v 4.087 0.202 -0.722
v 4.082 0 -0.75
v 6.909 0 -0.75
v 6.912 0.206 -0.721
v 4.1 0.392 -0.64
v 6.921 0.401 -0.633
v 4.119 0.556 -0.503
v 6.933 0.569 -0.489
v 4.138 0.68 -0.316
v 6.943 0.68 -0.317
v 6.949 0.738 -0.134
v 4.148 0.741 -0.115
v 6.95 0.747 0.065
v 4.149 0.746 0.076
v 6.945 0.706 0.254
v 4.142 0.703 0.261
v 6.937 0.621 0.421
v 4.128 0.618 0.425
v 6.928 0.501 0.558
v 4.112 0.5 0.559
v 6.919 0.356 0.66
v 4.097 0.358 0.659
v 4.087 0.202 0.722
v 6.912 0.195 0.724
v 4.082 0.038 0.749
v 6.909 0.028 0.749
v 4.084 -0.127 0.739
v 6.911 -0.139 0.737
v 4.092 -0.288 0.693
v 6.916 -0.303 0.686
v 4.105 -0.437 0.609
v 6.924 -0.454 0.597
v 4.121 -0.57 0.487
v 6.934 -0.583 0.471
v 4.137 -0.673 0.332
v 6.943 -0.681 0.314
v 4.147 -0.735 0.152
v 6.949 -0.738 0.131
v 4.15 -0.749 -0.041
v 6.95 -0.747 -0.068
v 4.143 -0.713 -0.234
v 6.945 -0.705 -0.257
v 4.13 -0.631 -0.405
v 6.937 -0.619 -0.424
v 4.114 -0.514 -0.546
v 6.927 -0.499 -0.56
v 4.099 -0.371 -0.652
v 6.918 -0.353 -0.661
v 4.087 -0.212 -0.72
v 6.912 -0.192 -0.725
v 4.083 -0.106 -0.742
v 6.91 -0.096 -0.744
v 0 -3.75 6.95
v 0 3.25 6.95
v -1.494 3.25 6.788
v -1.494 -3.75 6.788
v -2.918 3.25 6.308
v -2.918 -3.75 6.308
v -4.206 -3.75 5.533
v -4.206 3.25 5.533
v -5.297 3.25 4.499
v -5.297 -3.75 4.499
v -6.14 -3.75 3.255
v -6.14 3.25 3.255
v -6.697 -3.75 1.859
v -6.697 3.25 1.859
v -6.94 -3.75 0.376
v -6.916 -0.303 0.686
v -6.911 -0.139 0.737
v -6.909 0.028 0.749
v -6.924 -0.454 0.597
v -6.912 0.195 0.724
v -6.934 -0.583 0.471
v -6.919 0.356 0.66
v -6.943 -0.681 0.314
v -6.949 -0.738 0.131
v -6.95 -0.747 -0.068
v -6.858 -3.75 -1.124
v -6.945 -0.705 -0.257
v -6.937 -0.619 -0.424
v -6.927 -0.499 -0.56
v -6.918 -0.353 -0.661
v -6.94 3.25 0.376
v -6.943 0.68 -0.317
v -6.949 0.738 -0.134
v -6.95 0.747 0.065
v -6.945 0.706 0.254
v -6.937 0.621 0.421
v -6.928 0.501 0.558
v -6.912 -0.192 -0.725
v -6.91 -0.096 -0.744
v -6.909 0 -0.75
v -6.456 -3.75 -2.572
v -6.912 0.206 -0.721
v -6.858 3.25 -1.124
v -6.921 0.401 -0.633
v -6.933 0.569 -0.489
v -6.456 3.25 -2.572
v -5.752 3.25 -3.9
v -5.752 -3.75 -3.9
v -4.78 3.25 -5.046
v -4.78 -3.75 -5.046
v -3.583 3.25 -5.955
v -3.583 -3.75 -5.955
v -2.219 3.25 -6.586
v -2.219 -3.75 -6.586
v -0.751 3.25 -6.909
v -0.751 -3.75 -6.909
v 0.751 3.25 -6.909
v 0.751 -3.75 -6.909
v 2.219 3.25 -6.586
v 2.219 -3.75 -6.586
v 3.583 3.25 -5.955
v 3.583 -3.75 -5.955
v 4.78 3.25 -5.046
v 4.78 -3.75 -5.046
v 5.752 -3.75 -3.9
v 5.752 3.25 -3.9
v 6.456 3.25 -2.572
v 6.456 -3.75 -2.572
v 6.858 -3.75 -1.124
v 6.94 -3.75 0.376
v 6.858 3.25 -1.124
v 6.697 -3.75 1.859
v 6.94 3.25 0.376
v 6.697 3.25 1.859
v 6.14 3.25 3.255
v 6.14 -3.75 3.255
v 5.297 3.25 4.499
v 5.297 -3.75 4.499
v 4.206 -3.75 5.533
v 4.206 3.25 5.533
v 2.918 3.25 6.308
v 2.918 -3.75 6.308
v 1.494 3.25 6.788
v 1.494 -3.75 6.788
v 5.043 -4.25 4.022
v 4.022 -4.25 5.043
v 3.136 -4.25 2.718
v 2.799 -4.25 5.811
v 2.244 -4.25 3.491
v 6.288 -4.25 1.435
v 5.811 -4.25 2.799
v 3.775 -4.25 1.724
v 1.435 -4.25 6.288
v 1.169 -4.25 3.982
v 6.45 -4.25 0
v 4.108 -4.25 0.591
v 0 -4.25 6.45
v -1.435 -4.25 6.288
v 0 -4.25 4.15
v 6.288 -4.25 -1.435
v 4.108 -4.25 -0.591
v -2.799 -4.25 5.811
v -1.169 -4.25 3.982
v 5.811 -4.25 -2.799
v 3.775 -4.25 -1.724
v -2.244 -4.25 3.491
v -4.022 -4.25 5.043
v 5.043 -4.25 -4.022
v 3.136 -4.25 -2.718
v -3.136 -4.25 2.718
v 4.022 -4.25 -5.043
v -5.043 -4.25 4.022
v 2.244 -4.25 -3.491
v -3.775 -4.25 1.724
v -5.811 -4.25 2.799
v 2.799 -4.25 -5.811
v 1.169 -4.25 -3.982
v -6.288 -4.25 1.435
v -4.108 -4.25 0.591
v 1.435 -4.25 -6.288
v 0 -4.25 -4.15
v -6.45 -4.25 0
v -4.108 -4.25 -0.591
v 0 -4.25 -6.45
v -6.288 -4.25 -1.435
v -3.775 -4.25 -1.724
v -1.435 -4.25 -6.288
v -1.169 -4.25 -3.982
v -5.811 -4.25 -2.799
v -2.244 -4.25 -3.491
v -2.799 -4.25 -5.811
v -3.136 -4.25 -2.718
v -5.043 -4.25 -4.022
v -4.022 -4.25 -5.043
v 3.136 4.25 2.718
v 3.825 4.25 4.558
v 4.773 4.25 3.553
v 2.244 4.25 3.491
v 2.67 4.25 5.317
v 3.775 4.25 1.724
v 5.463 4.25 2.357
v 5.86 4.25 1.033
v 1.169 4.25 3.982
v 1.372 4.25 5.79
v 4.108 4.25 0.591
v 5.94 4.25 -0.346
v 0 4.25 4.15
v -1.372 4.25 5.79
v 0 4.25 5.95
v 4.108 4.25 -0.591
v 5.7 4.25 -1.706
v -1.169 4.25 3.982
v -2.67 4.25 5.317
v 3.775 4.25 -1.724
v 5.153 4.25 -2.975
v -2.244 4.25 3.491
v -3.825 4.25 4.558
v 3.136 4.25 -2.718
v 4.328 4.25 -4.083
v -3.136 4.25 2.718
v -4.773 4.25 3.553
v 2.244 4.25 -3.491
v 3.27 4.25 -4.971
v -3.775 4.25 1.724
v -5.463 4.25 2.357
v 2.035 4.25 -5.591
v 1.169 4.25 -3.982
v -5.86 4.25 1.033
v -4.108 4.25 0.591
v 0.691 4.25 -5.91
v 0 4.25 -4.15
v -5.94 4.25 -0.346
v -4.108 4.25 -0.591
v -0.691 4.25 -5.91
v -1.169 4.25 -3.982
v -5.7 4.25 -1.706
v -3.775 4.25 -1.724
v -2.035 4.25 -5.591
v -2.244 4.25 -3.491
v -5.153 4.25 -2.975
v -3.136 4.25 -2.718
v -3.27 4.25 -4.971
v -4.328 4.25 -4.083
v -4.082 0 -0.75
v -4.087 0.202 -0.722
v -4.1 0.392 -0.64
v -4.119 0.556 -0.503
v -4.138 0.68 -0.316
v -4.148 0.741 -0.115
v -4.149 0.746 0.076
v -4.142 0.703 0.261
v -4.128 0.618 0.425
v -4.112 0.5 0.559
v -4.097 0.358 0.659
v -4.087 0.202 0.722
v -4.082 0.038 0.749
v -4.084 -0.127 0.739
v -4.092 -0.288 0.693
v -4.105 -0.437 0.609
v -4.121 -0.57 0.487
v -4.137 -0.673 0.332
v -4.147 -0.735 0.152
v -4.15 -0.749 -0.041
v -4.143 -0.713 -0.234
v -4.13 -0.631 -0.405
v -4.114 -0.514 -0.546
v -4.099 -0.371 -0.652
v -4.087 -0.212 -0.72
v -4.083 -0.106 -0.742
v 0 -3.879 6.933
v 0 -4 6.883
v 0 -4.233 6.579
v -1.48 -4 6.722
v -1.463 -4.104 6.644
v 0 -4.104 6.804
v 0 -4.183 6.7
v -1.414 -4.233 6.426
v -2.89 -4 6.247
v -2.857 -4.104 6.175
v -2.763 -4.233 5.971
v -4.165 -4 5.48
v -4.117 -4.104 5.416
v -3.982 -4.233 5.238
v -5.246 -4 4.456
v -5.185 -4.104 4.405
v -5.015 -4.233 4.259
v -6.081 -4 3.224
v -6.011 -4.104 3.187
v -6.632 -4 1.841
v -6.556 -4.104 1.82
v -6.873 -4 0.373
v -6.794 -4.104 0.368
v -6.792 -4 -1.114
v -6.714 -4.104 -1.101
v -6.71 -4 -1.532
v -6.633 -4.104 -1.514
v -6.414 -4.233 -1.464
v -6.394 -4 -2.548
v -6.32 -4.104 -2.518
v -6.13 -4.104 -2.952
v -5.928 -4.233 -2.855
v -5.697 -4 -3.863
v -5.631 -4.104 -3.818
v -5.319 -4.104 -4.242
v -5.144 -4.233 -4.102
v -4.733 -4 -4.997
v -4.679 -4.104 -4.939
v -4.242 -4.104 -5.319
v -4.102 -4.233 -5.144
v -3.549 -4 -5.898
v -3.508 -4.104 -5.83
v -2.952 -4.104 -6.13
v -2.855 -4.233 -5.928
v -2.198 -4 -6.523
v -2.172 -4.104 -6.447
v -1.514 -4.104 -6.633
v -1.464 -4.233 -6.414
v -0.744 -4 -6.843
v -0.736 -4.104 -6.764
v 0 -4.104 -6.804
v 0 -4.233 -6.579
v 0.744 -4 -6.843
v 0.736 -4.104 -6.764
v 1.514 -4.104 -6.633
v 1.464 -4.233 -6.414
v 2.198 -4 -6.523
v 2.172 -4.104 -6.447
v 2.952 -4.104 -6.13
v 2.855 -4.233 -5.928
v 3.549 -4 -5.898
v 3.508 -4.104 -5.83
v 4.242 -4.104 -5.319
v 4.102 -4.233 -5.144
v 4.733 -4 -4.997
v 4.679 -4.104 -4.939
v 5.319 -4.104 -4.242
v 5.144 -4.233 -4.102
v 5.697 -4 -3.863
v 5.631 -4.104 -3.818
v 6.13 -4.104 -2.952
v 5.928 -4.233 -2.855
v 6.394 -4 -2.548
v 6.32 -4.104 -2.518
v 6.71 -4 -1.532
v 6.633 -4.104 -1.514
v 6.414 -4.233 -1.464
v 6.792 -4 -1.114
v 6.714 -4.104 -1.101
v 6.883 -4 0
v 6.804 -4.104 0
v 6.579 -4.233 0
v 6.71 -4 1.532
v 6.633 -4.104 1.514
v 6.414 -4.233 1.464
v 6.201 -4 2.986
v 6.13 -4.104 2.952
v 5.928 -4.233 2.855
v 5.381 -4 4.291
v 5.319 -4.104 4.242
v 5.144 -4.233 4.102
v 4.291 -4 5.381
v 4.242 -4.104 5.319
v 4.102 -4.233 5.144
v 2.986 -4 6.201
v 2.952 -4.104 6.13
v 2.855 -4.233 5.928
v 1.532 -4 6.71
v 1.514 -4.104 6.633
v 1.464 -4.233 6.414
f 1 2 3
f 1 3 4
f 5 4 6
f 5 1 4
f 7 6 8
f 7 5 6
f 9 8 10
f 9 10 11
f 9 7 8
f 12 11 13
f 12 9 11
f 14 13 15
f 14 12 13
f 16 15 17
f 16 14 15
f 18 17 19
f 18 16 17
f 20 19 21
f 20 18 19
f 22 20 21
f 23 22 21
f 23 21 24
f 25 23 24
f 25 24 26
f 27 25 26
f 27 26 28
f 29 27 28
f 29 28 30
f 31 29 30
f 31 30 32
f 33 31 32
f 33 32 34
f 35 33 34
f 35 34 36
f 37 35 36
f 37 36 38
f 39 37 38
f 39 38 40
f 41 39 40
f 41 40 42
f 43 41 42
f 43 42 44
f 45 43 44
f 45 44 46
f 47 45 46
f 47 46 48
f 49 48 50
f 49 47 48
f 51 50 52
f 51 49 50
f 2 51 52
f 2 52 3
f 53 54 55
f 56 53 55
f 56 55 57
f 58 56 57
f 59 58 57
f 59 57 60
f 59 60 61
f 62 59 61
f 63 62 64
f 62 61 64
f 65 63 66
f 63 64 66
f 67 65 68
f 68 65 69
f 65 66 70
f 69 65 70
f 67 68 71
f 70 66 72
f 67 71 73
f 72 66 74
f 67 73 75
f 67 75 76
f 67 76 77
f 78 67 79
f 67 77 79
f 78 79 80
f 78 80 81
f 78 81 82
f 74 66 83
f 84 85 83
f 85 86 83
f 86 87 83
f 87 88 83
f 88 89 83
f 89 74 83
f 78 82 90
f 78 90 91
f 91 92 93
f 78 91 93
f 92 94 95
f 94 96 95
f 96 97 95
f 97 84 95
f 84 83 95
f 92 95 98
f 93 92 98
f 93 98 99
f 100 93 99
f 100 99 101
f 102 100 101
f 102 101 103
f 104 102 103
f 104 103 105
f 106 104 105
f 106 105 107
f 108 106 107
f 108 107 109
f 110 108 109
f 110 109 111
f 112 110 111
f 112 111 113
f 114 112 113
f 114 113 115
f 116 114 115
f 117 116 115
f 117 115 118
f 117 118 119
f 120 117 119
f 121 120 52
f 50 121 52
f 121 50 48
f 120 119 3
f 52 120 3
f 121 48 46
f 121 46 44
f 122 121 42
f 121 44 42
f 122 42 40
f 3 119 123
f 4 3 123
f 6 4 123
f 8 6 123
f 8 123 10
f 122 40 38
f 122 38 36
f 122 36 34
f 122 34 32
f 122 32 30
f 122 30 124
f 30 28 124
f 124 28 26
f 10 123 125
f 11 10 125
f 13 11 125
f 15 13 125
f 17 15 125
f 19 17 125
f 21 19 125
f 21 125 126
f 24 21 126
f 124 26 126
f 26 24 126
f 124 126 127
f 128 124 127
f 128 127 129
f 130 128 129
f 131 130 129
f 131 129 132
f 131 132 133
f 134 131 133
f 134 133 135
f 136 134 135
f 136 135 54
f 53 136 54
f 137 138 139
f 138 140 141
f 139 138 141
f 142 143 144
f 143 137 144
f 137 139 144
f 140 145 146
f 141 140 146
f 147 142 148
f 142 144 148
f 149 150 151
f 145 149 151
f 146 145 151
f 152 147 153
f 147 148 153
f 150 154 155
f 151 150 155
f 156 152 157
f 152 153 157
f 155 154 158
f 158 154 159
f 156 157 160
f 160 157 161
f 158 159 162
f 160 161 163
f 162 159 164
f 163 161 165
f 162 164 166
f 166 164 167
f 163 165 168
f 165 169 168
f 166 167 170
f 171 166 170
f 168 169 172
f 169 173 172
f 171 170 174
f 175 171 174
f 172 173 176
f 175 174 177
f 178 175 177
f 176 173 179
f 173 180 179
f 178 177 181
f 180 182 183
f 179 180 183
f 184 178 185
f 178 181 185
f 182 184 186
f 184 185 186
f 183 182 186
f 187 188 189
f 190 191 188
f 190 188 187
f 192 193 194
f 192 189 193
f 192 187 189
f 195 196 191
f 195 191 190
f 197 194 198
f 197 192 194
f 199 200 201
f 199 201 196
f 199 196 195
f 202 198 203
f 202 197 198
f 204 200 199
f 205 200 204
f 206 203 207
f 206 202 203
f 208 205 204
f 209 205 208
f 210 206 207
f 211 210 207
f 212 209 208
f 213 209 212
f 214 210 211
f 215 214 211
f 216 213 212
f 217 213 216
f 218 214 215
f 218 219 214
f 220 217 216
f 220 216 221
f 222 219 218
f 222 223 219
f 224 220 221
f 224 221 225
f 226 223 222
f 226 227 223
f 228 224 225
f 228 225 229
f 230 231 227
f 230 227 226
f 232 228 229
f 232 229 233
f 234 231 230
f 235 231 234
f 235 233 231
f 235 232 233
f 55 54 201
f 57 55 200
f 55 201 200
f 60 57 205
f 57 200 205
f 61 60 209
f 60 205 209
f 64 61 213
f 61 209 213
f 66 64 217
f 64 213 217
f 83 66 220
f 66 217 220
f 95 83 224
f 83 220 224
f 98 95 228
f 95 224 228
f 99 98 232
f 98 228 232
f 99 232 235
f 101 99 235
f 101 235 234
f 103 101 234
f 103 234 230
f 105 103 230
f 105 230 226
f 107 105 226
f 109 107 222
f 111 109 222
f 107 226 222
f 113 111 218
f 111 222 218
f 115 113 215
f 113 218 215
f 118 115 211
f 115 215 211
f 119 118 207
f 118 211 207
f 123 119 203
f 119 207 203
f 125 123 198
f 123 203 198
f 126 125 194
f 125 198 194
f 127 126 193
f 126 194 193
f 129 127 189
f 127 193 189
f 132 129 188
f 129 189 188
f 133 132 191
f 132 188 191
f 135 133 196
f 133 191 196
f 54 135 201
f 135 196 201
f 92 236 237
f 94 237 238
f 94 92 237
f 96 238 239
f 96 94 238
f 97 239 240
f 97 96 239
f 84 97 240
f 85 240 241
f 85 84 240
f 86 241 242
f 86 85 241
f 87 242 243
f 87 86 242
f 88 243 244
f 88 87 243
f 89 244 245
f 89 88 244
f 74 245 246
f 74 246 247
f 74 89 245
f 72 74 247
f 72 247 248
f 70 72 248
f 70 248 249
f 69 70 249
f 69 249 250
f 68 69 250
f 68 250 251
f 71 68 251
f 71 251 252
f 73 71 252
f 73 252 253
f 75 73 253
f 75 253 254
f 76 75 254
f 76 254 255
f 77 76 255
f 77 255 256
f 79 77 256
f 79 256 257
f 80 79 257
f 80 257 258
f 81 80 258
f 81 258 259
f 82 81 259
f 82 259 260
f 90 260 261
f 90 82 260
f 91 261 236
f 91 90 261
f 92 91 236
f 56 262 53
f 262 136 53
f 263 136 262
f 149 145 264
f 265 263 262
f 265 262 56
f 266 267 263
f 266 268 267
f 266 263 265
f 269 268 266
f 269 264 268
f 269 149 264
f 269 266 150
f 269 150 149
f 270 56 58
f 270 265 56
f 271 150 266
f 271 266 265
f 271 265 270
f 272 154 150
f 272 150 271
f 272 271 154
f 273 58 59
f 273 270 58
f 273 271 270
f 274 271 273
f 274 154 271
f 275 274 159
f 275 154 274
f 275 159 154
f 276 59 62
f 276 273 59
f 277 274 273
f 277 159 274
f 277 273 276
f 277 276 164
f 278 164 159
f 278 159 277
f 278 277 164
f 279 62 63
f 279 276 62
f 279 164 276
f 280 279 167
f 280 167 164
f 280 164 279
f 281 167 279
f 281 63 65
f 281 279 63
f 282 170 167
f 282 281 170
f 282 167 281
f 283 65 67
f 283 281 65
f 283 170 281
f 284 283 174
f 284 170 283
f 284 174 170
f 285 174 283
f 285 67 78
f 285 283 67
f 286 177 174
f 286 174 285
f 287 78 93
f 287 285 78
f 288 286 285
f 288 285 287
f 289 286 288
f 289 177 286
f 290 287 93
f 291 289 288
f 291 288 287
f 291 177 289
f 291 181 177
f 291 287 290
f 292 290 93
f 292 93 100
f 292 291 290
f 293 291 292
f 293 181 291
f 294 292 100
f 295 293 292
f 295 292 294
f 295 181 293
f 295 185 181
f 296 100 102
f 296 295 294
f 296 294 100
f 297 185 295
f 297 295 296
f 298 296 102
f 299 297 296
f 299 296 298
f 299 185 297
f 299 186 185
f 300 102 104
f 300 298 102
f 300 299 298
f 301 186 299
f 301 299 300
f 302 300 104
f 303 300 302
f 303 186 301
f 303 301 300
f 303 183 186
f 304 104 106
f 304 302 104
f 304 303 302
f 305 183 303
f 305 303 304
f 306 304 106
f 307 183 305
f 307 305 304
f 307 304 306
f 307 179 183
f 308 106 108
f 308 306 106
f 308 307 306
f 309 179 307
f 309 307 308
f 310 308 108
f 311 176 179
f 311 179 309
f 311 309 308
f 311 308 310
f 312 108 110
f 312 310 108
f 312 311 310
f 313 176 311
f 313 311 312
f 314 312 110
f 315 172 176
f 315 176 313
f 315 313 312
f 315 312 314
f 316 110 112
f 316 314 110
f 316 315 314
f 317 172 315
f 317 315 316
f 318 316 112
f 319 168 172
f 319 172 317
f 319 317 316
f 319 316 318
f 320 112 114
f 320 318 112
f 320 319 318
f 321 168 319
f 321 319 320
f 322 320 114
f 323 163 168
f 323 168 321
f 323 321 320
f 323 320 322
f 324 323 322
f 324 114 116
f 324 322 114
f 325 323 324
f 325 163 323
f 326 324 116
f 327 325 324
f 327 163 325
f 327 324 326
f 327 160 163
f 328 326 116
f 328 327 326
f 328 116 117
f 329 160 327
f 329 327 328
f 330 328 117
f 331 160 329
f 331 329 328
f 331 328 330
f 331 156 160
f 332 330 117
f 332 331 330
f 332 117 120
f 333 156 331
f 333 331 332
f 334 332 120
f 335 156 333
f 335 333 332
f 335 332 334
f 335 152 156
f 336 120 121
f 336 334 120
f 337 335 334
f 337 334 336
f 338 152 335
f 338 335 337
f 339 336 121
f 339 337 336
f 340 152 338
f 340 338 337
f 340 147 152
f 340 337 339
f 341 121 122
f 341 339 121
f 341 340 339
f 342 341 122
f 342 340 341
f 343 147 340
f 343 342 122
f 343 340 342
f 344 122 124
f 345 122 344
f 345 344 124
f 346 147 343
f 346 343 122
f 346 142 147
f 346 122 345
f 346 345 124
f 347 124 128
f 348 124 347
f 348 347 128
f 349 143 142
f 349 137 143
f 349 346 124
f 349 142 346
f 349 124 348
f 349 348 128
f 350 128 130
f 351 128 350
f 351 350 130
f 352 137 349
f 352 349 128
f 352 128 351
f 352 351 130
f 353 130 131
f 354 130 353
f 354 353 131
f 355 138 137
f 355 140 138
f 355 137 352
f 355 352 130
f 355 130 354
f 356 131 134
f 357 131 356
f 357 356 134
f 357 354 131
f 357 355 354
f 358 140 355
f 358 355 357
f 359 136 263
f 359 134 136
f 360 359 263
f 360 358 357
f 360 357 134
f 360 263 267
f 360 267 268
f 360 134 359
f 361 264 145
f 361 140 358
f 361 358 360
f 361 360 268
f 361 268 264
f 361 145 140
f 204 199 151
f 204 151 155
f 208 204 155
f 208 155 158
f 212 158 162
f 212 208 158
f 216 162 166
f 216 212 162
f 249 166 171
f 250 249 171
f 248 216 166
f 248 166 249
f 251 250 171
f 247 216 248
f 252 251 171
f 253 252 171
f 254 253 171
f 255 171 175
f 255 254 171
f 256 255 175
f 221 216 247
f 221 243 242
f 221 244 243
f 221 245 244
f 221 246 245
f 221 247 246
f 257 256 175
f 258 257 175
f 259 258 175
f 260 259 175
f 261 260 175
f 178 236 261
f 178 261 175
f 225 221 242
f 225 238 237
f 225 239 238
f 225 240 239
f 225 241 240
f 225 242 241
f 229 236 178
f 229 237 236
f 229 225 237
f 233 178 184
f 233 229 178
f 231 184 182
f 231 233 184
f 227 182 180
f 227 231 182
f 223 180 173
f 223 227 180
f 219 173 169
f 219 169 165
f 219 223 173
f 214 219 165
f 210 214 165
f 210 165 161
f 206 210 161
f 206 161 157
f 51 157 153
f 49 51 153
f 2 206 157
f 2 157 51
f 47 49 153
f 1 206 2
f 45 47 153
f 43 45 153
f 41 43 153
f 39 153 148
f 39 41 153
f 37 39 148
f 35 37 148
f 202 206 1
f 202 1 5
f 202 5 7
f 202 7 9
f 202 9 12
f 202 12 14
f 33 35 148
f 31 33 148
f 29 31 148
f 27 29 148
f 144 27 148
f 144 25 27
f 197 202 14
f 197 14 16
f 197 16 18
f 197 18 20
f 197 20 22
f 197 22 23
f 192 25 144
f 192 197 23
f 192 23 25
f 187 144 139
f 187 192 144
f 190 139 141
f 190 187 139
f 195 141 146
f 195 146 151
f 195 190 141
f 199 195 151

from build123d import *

# Parameters (mm, degrees)
SKETCH1_W               = 2.8
SKETCH1_H               = 8.5
CHAMFER1_SIZE           = 1
CUT_EXTRUDE1_DEPTH      = 11.70829118
CUT_EXTRUDE1_DEPTH_BACK = 11.70829118
SKETCH3_R               = 0.75
FILLET1_R               = 0.5


with BuildPart() as part:
    # Sketch1 → Revolve1 (revolve)
    with BuildSketch(Plane(origin=(0, 0, 0), x_dir=(0, 0, -1), z_dir=(1, 0, 0)), mode=Mode.PRIVATE) as revolve1_sk:
        with Locations((5.55, 0)):
            Rectangle(SKETCH1_W, SKETCH1_H)
    revolve(revolve1_sk.sketch.rotate(Axis((0, 19.013157895, 0), (0, -1, 0)), 180), axis=Axis((0, 19.013157895, 0), (0, -1, 0)))

    # Chamfer1
    chamfer1_edges = [part.edges().sort_by_distance(p)[0] for p in [
        (0, 4.25, -6.95),
    ]]
    chamfer(chamfer1_edges, length=CHAMFER1_SIZE)

    # Sketch3 → Cut-Extrude1 (cut, two sides: drawn at the far end of the back side and taken through both)
    with BuildSketch(Plane(origin=(0, 0, 0), x_dir=(0, 0, -1), z_dir=(1, 0, 0)).offset(-CUT_EXTRUDE1_DEPTH_BACK)):
        Circle(SKETCH3_R)
    extrude(amount=CUT_EXTRUDE1_DEPTH + CUT_EXTRUDE1_DEPTH_BACK, mode=Mode.SUBTRACT)

    # Fillet1
    fillet1_edges = [part.edges().sort_by_distance(p)[0] for p in [
        (0, -4.25, -6.95),
    ]]
    fillet(fillet1_edges, radius=FILLET1_R)


solid = part.part
